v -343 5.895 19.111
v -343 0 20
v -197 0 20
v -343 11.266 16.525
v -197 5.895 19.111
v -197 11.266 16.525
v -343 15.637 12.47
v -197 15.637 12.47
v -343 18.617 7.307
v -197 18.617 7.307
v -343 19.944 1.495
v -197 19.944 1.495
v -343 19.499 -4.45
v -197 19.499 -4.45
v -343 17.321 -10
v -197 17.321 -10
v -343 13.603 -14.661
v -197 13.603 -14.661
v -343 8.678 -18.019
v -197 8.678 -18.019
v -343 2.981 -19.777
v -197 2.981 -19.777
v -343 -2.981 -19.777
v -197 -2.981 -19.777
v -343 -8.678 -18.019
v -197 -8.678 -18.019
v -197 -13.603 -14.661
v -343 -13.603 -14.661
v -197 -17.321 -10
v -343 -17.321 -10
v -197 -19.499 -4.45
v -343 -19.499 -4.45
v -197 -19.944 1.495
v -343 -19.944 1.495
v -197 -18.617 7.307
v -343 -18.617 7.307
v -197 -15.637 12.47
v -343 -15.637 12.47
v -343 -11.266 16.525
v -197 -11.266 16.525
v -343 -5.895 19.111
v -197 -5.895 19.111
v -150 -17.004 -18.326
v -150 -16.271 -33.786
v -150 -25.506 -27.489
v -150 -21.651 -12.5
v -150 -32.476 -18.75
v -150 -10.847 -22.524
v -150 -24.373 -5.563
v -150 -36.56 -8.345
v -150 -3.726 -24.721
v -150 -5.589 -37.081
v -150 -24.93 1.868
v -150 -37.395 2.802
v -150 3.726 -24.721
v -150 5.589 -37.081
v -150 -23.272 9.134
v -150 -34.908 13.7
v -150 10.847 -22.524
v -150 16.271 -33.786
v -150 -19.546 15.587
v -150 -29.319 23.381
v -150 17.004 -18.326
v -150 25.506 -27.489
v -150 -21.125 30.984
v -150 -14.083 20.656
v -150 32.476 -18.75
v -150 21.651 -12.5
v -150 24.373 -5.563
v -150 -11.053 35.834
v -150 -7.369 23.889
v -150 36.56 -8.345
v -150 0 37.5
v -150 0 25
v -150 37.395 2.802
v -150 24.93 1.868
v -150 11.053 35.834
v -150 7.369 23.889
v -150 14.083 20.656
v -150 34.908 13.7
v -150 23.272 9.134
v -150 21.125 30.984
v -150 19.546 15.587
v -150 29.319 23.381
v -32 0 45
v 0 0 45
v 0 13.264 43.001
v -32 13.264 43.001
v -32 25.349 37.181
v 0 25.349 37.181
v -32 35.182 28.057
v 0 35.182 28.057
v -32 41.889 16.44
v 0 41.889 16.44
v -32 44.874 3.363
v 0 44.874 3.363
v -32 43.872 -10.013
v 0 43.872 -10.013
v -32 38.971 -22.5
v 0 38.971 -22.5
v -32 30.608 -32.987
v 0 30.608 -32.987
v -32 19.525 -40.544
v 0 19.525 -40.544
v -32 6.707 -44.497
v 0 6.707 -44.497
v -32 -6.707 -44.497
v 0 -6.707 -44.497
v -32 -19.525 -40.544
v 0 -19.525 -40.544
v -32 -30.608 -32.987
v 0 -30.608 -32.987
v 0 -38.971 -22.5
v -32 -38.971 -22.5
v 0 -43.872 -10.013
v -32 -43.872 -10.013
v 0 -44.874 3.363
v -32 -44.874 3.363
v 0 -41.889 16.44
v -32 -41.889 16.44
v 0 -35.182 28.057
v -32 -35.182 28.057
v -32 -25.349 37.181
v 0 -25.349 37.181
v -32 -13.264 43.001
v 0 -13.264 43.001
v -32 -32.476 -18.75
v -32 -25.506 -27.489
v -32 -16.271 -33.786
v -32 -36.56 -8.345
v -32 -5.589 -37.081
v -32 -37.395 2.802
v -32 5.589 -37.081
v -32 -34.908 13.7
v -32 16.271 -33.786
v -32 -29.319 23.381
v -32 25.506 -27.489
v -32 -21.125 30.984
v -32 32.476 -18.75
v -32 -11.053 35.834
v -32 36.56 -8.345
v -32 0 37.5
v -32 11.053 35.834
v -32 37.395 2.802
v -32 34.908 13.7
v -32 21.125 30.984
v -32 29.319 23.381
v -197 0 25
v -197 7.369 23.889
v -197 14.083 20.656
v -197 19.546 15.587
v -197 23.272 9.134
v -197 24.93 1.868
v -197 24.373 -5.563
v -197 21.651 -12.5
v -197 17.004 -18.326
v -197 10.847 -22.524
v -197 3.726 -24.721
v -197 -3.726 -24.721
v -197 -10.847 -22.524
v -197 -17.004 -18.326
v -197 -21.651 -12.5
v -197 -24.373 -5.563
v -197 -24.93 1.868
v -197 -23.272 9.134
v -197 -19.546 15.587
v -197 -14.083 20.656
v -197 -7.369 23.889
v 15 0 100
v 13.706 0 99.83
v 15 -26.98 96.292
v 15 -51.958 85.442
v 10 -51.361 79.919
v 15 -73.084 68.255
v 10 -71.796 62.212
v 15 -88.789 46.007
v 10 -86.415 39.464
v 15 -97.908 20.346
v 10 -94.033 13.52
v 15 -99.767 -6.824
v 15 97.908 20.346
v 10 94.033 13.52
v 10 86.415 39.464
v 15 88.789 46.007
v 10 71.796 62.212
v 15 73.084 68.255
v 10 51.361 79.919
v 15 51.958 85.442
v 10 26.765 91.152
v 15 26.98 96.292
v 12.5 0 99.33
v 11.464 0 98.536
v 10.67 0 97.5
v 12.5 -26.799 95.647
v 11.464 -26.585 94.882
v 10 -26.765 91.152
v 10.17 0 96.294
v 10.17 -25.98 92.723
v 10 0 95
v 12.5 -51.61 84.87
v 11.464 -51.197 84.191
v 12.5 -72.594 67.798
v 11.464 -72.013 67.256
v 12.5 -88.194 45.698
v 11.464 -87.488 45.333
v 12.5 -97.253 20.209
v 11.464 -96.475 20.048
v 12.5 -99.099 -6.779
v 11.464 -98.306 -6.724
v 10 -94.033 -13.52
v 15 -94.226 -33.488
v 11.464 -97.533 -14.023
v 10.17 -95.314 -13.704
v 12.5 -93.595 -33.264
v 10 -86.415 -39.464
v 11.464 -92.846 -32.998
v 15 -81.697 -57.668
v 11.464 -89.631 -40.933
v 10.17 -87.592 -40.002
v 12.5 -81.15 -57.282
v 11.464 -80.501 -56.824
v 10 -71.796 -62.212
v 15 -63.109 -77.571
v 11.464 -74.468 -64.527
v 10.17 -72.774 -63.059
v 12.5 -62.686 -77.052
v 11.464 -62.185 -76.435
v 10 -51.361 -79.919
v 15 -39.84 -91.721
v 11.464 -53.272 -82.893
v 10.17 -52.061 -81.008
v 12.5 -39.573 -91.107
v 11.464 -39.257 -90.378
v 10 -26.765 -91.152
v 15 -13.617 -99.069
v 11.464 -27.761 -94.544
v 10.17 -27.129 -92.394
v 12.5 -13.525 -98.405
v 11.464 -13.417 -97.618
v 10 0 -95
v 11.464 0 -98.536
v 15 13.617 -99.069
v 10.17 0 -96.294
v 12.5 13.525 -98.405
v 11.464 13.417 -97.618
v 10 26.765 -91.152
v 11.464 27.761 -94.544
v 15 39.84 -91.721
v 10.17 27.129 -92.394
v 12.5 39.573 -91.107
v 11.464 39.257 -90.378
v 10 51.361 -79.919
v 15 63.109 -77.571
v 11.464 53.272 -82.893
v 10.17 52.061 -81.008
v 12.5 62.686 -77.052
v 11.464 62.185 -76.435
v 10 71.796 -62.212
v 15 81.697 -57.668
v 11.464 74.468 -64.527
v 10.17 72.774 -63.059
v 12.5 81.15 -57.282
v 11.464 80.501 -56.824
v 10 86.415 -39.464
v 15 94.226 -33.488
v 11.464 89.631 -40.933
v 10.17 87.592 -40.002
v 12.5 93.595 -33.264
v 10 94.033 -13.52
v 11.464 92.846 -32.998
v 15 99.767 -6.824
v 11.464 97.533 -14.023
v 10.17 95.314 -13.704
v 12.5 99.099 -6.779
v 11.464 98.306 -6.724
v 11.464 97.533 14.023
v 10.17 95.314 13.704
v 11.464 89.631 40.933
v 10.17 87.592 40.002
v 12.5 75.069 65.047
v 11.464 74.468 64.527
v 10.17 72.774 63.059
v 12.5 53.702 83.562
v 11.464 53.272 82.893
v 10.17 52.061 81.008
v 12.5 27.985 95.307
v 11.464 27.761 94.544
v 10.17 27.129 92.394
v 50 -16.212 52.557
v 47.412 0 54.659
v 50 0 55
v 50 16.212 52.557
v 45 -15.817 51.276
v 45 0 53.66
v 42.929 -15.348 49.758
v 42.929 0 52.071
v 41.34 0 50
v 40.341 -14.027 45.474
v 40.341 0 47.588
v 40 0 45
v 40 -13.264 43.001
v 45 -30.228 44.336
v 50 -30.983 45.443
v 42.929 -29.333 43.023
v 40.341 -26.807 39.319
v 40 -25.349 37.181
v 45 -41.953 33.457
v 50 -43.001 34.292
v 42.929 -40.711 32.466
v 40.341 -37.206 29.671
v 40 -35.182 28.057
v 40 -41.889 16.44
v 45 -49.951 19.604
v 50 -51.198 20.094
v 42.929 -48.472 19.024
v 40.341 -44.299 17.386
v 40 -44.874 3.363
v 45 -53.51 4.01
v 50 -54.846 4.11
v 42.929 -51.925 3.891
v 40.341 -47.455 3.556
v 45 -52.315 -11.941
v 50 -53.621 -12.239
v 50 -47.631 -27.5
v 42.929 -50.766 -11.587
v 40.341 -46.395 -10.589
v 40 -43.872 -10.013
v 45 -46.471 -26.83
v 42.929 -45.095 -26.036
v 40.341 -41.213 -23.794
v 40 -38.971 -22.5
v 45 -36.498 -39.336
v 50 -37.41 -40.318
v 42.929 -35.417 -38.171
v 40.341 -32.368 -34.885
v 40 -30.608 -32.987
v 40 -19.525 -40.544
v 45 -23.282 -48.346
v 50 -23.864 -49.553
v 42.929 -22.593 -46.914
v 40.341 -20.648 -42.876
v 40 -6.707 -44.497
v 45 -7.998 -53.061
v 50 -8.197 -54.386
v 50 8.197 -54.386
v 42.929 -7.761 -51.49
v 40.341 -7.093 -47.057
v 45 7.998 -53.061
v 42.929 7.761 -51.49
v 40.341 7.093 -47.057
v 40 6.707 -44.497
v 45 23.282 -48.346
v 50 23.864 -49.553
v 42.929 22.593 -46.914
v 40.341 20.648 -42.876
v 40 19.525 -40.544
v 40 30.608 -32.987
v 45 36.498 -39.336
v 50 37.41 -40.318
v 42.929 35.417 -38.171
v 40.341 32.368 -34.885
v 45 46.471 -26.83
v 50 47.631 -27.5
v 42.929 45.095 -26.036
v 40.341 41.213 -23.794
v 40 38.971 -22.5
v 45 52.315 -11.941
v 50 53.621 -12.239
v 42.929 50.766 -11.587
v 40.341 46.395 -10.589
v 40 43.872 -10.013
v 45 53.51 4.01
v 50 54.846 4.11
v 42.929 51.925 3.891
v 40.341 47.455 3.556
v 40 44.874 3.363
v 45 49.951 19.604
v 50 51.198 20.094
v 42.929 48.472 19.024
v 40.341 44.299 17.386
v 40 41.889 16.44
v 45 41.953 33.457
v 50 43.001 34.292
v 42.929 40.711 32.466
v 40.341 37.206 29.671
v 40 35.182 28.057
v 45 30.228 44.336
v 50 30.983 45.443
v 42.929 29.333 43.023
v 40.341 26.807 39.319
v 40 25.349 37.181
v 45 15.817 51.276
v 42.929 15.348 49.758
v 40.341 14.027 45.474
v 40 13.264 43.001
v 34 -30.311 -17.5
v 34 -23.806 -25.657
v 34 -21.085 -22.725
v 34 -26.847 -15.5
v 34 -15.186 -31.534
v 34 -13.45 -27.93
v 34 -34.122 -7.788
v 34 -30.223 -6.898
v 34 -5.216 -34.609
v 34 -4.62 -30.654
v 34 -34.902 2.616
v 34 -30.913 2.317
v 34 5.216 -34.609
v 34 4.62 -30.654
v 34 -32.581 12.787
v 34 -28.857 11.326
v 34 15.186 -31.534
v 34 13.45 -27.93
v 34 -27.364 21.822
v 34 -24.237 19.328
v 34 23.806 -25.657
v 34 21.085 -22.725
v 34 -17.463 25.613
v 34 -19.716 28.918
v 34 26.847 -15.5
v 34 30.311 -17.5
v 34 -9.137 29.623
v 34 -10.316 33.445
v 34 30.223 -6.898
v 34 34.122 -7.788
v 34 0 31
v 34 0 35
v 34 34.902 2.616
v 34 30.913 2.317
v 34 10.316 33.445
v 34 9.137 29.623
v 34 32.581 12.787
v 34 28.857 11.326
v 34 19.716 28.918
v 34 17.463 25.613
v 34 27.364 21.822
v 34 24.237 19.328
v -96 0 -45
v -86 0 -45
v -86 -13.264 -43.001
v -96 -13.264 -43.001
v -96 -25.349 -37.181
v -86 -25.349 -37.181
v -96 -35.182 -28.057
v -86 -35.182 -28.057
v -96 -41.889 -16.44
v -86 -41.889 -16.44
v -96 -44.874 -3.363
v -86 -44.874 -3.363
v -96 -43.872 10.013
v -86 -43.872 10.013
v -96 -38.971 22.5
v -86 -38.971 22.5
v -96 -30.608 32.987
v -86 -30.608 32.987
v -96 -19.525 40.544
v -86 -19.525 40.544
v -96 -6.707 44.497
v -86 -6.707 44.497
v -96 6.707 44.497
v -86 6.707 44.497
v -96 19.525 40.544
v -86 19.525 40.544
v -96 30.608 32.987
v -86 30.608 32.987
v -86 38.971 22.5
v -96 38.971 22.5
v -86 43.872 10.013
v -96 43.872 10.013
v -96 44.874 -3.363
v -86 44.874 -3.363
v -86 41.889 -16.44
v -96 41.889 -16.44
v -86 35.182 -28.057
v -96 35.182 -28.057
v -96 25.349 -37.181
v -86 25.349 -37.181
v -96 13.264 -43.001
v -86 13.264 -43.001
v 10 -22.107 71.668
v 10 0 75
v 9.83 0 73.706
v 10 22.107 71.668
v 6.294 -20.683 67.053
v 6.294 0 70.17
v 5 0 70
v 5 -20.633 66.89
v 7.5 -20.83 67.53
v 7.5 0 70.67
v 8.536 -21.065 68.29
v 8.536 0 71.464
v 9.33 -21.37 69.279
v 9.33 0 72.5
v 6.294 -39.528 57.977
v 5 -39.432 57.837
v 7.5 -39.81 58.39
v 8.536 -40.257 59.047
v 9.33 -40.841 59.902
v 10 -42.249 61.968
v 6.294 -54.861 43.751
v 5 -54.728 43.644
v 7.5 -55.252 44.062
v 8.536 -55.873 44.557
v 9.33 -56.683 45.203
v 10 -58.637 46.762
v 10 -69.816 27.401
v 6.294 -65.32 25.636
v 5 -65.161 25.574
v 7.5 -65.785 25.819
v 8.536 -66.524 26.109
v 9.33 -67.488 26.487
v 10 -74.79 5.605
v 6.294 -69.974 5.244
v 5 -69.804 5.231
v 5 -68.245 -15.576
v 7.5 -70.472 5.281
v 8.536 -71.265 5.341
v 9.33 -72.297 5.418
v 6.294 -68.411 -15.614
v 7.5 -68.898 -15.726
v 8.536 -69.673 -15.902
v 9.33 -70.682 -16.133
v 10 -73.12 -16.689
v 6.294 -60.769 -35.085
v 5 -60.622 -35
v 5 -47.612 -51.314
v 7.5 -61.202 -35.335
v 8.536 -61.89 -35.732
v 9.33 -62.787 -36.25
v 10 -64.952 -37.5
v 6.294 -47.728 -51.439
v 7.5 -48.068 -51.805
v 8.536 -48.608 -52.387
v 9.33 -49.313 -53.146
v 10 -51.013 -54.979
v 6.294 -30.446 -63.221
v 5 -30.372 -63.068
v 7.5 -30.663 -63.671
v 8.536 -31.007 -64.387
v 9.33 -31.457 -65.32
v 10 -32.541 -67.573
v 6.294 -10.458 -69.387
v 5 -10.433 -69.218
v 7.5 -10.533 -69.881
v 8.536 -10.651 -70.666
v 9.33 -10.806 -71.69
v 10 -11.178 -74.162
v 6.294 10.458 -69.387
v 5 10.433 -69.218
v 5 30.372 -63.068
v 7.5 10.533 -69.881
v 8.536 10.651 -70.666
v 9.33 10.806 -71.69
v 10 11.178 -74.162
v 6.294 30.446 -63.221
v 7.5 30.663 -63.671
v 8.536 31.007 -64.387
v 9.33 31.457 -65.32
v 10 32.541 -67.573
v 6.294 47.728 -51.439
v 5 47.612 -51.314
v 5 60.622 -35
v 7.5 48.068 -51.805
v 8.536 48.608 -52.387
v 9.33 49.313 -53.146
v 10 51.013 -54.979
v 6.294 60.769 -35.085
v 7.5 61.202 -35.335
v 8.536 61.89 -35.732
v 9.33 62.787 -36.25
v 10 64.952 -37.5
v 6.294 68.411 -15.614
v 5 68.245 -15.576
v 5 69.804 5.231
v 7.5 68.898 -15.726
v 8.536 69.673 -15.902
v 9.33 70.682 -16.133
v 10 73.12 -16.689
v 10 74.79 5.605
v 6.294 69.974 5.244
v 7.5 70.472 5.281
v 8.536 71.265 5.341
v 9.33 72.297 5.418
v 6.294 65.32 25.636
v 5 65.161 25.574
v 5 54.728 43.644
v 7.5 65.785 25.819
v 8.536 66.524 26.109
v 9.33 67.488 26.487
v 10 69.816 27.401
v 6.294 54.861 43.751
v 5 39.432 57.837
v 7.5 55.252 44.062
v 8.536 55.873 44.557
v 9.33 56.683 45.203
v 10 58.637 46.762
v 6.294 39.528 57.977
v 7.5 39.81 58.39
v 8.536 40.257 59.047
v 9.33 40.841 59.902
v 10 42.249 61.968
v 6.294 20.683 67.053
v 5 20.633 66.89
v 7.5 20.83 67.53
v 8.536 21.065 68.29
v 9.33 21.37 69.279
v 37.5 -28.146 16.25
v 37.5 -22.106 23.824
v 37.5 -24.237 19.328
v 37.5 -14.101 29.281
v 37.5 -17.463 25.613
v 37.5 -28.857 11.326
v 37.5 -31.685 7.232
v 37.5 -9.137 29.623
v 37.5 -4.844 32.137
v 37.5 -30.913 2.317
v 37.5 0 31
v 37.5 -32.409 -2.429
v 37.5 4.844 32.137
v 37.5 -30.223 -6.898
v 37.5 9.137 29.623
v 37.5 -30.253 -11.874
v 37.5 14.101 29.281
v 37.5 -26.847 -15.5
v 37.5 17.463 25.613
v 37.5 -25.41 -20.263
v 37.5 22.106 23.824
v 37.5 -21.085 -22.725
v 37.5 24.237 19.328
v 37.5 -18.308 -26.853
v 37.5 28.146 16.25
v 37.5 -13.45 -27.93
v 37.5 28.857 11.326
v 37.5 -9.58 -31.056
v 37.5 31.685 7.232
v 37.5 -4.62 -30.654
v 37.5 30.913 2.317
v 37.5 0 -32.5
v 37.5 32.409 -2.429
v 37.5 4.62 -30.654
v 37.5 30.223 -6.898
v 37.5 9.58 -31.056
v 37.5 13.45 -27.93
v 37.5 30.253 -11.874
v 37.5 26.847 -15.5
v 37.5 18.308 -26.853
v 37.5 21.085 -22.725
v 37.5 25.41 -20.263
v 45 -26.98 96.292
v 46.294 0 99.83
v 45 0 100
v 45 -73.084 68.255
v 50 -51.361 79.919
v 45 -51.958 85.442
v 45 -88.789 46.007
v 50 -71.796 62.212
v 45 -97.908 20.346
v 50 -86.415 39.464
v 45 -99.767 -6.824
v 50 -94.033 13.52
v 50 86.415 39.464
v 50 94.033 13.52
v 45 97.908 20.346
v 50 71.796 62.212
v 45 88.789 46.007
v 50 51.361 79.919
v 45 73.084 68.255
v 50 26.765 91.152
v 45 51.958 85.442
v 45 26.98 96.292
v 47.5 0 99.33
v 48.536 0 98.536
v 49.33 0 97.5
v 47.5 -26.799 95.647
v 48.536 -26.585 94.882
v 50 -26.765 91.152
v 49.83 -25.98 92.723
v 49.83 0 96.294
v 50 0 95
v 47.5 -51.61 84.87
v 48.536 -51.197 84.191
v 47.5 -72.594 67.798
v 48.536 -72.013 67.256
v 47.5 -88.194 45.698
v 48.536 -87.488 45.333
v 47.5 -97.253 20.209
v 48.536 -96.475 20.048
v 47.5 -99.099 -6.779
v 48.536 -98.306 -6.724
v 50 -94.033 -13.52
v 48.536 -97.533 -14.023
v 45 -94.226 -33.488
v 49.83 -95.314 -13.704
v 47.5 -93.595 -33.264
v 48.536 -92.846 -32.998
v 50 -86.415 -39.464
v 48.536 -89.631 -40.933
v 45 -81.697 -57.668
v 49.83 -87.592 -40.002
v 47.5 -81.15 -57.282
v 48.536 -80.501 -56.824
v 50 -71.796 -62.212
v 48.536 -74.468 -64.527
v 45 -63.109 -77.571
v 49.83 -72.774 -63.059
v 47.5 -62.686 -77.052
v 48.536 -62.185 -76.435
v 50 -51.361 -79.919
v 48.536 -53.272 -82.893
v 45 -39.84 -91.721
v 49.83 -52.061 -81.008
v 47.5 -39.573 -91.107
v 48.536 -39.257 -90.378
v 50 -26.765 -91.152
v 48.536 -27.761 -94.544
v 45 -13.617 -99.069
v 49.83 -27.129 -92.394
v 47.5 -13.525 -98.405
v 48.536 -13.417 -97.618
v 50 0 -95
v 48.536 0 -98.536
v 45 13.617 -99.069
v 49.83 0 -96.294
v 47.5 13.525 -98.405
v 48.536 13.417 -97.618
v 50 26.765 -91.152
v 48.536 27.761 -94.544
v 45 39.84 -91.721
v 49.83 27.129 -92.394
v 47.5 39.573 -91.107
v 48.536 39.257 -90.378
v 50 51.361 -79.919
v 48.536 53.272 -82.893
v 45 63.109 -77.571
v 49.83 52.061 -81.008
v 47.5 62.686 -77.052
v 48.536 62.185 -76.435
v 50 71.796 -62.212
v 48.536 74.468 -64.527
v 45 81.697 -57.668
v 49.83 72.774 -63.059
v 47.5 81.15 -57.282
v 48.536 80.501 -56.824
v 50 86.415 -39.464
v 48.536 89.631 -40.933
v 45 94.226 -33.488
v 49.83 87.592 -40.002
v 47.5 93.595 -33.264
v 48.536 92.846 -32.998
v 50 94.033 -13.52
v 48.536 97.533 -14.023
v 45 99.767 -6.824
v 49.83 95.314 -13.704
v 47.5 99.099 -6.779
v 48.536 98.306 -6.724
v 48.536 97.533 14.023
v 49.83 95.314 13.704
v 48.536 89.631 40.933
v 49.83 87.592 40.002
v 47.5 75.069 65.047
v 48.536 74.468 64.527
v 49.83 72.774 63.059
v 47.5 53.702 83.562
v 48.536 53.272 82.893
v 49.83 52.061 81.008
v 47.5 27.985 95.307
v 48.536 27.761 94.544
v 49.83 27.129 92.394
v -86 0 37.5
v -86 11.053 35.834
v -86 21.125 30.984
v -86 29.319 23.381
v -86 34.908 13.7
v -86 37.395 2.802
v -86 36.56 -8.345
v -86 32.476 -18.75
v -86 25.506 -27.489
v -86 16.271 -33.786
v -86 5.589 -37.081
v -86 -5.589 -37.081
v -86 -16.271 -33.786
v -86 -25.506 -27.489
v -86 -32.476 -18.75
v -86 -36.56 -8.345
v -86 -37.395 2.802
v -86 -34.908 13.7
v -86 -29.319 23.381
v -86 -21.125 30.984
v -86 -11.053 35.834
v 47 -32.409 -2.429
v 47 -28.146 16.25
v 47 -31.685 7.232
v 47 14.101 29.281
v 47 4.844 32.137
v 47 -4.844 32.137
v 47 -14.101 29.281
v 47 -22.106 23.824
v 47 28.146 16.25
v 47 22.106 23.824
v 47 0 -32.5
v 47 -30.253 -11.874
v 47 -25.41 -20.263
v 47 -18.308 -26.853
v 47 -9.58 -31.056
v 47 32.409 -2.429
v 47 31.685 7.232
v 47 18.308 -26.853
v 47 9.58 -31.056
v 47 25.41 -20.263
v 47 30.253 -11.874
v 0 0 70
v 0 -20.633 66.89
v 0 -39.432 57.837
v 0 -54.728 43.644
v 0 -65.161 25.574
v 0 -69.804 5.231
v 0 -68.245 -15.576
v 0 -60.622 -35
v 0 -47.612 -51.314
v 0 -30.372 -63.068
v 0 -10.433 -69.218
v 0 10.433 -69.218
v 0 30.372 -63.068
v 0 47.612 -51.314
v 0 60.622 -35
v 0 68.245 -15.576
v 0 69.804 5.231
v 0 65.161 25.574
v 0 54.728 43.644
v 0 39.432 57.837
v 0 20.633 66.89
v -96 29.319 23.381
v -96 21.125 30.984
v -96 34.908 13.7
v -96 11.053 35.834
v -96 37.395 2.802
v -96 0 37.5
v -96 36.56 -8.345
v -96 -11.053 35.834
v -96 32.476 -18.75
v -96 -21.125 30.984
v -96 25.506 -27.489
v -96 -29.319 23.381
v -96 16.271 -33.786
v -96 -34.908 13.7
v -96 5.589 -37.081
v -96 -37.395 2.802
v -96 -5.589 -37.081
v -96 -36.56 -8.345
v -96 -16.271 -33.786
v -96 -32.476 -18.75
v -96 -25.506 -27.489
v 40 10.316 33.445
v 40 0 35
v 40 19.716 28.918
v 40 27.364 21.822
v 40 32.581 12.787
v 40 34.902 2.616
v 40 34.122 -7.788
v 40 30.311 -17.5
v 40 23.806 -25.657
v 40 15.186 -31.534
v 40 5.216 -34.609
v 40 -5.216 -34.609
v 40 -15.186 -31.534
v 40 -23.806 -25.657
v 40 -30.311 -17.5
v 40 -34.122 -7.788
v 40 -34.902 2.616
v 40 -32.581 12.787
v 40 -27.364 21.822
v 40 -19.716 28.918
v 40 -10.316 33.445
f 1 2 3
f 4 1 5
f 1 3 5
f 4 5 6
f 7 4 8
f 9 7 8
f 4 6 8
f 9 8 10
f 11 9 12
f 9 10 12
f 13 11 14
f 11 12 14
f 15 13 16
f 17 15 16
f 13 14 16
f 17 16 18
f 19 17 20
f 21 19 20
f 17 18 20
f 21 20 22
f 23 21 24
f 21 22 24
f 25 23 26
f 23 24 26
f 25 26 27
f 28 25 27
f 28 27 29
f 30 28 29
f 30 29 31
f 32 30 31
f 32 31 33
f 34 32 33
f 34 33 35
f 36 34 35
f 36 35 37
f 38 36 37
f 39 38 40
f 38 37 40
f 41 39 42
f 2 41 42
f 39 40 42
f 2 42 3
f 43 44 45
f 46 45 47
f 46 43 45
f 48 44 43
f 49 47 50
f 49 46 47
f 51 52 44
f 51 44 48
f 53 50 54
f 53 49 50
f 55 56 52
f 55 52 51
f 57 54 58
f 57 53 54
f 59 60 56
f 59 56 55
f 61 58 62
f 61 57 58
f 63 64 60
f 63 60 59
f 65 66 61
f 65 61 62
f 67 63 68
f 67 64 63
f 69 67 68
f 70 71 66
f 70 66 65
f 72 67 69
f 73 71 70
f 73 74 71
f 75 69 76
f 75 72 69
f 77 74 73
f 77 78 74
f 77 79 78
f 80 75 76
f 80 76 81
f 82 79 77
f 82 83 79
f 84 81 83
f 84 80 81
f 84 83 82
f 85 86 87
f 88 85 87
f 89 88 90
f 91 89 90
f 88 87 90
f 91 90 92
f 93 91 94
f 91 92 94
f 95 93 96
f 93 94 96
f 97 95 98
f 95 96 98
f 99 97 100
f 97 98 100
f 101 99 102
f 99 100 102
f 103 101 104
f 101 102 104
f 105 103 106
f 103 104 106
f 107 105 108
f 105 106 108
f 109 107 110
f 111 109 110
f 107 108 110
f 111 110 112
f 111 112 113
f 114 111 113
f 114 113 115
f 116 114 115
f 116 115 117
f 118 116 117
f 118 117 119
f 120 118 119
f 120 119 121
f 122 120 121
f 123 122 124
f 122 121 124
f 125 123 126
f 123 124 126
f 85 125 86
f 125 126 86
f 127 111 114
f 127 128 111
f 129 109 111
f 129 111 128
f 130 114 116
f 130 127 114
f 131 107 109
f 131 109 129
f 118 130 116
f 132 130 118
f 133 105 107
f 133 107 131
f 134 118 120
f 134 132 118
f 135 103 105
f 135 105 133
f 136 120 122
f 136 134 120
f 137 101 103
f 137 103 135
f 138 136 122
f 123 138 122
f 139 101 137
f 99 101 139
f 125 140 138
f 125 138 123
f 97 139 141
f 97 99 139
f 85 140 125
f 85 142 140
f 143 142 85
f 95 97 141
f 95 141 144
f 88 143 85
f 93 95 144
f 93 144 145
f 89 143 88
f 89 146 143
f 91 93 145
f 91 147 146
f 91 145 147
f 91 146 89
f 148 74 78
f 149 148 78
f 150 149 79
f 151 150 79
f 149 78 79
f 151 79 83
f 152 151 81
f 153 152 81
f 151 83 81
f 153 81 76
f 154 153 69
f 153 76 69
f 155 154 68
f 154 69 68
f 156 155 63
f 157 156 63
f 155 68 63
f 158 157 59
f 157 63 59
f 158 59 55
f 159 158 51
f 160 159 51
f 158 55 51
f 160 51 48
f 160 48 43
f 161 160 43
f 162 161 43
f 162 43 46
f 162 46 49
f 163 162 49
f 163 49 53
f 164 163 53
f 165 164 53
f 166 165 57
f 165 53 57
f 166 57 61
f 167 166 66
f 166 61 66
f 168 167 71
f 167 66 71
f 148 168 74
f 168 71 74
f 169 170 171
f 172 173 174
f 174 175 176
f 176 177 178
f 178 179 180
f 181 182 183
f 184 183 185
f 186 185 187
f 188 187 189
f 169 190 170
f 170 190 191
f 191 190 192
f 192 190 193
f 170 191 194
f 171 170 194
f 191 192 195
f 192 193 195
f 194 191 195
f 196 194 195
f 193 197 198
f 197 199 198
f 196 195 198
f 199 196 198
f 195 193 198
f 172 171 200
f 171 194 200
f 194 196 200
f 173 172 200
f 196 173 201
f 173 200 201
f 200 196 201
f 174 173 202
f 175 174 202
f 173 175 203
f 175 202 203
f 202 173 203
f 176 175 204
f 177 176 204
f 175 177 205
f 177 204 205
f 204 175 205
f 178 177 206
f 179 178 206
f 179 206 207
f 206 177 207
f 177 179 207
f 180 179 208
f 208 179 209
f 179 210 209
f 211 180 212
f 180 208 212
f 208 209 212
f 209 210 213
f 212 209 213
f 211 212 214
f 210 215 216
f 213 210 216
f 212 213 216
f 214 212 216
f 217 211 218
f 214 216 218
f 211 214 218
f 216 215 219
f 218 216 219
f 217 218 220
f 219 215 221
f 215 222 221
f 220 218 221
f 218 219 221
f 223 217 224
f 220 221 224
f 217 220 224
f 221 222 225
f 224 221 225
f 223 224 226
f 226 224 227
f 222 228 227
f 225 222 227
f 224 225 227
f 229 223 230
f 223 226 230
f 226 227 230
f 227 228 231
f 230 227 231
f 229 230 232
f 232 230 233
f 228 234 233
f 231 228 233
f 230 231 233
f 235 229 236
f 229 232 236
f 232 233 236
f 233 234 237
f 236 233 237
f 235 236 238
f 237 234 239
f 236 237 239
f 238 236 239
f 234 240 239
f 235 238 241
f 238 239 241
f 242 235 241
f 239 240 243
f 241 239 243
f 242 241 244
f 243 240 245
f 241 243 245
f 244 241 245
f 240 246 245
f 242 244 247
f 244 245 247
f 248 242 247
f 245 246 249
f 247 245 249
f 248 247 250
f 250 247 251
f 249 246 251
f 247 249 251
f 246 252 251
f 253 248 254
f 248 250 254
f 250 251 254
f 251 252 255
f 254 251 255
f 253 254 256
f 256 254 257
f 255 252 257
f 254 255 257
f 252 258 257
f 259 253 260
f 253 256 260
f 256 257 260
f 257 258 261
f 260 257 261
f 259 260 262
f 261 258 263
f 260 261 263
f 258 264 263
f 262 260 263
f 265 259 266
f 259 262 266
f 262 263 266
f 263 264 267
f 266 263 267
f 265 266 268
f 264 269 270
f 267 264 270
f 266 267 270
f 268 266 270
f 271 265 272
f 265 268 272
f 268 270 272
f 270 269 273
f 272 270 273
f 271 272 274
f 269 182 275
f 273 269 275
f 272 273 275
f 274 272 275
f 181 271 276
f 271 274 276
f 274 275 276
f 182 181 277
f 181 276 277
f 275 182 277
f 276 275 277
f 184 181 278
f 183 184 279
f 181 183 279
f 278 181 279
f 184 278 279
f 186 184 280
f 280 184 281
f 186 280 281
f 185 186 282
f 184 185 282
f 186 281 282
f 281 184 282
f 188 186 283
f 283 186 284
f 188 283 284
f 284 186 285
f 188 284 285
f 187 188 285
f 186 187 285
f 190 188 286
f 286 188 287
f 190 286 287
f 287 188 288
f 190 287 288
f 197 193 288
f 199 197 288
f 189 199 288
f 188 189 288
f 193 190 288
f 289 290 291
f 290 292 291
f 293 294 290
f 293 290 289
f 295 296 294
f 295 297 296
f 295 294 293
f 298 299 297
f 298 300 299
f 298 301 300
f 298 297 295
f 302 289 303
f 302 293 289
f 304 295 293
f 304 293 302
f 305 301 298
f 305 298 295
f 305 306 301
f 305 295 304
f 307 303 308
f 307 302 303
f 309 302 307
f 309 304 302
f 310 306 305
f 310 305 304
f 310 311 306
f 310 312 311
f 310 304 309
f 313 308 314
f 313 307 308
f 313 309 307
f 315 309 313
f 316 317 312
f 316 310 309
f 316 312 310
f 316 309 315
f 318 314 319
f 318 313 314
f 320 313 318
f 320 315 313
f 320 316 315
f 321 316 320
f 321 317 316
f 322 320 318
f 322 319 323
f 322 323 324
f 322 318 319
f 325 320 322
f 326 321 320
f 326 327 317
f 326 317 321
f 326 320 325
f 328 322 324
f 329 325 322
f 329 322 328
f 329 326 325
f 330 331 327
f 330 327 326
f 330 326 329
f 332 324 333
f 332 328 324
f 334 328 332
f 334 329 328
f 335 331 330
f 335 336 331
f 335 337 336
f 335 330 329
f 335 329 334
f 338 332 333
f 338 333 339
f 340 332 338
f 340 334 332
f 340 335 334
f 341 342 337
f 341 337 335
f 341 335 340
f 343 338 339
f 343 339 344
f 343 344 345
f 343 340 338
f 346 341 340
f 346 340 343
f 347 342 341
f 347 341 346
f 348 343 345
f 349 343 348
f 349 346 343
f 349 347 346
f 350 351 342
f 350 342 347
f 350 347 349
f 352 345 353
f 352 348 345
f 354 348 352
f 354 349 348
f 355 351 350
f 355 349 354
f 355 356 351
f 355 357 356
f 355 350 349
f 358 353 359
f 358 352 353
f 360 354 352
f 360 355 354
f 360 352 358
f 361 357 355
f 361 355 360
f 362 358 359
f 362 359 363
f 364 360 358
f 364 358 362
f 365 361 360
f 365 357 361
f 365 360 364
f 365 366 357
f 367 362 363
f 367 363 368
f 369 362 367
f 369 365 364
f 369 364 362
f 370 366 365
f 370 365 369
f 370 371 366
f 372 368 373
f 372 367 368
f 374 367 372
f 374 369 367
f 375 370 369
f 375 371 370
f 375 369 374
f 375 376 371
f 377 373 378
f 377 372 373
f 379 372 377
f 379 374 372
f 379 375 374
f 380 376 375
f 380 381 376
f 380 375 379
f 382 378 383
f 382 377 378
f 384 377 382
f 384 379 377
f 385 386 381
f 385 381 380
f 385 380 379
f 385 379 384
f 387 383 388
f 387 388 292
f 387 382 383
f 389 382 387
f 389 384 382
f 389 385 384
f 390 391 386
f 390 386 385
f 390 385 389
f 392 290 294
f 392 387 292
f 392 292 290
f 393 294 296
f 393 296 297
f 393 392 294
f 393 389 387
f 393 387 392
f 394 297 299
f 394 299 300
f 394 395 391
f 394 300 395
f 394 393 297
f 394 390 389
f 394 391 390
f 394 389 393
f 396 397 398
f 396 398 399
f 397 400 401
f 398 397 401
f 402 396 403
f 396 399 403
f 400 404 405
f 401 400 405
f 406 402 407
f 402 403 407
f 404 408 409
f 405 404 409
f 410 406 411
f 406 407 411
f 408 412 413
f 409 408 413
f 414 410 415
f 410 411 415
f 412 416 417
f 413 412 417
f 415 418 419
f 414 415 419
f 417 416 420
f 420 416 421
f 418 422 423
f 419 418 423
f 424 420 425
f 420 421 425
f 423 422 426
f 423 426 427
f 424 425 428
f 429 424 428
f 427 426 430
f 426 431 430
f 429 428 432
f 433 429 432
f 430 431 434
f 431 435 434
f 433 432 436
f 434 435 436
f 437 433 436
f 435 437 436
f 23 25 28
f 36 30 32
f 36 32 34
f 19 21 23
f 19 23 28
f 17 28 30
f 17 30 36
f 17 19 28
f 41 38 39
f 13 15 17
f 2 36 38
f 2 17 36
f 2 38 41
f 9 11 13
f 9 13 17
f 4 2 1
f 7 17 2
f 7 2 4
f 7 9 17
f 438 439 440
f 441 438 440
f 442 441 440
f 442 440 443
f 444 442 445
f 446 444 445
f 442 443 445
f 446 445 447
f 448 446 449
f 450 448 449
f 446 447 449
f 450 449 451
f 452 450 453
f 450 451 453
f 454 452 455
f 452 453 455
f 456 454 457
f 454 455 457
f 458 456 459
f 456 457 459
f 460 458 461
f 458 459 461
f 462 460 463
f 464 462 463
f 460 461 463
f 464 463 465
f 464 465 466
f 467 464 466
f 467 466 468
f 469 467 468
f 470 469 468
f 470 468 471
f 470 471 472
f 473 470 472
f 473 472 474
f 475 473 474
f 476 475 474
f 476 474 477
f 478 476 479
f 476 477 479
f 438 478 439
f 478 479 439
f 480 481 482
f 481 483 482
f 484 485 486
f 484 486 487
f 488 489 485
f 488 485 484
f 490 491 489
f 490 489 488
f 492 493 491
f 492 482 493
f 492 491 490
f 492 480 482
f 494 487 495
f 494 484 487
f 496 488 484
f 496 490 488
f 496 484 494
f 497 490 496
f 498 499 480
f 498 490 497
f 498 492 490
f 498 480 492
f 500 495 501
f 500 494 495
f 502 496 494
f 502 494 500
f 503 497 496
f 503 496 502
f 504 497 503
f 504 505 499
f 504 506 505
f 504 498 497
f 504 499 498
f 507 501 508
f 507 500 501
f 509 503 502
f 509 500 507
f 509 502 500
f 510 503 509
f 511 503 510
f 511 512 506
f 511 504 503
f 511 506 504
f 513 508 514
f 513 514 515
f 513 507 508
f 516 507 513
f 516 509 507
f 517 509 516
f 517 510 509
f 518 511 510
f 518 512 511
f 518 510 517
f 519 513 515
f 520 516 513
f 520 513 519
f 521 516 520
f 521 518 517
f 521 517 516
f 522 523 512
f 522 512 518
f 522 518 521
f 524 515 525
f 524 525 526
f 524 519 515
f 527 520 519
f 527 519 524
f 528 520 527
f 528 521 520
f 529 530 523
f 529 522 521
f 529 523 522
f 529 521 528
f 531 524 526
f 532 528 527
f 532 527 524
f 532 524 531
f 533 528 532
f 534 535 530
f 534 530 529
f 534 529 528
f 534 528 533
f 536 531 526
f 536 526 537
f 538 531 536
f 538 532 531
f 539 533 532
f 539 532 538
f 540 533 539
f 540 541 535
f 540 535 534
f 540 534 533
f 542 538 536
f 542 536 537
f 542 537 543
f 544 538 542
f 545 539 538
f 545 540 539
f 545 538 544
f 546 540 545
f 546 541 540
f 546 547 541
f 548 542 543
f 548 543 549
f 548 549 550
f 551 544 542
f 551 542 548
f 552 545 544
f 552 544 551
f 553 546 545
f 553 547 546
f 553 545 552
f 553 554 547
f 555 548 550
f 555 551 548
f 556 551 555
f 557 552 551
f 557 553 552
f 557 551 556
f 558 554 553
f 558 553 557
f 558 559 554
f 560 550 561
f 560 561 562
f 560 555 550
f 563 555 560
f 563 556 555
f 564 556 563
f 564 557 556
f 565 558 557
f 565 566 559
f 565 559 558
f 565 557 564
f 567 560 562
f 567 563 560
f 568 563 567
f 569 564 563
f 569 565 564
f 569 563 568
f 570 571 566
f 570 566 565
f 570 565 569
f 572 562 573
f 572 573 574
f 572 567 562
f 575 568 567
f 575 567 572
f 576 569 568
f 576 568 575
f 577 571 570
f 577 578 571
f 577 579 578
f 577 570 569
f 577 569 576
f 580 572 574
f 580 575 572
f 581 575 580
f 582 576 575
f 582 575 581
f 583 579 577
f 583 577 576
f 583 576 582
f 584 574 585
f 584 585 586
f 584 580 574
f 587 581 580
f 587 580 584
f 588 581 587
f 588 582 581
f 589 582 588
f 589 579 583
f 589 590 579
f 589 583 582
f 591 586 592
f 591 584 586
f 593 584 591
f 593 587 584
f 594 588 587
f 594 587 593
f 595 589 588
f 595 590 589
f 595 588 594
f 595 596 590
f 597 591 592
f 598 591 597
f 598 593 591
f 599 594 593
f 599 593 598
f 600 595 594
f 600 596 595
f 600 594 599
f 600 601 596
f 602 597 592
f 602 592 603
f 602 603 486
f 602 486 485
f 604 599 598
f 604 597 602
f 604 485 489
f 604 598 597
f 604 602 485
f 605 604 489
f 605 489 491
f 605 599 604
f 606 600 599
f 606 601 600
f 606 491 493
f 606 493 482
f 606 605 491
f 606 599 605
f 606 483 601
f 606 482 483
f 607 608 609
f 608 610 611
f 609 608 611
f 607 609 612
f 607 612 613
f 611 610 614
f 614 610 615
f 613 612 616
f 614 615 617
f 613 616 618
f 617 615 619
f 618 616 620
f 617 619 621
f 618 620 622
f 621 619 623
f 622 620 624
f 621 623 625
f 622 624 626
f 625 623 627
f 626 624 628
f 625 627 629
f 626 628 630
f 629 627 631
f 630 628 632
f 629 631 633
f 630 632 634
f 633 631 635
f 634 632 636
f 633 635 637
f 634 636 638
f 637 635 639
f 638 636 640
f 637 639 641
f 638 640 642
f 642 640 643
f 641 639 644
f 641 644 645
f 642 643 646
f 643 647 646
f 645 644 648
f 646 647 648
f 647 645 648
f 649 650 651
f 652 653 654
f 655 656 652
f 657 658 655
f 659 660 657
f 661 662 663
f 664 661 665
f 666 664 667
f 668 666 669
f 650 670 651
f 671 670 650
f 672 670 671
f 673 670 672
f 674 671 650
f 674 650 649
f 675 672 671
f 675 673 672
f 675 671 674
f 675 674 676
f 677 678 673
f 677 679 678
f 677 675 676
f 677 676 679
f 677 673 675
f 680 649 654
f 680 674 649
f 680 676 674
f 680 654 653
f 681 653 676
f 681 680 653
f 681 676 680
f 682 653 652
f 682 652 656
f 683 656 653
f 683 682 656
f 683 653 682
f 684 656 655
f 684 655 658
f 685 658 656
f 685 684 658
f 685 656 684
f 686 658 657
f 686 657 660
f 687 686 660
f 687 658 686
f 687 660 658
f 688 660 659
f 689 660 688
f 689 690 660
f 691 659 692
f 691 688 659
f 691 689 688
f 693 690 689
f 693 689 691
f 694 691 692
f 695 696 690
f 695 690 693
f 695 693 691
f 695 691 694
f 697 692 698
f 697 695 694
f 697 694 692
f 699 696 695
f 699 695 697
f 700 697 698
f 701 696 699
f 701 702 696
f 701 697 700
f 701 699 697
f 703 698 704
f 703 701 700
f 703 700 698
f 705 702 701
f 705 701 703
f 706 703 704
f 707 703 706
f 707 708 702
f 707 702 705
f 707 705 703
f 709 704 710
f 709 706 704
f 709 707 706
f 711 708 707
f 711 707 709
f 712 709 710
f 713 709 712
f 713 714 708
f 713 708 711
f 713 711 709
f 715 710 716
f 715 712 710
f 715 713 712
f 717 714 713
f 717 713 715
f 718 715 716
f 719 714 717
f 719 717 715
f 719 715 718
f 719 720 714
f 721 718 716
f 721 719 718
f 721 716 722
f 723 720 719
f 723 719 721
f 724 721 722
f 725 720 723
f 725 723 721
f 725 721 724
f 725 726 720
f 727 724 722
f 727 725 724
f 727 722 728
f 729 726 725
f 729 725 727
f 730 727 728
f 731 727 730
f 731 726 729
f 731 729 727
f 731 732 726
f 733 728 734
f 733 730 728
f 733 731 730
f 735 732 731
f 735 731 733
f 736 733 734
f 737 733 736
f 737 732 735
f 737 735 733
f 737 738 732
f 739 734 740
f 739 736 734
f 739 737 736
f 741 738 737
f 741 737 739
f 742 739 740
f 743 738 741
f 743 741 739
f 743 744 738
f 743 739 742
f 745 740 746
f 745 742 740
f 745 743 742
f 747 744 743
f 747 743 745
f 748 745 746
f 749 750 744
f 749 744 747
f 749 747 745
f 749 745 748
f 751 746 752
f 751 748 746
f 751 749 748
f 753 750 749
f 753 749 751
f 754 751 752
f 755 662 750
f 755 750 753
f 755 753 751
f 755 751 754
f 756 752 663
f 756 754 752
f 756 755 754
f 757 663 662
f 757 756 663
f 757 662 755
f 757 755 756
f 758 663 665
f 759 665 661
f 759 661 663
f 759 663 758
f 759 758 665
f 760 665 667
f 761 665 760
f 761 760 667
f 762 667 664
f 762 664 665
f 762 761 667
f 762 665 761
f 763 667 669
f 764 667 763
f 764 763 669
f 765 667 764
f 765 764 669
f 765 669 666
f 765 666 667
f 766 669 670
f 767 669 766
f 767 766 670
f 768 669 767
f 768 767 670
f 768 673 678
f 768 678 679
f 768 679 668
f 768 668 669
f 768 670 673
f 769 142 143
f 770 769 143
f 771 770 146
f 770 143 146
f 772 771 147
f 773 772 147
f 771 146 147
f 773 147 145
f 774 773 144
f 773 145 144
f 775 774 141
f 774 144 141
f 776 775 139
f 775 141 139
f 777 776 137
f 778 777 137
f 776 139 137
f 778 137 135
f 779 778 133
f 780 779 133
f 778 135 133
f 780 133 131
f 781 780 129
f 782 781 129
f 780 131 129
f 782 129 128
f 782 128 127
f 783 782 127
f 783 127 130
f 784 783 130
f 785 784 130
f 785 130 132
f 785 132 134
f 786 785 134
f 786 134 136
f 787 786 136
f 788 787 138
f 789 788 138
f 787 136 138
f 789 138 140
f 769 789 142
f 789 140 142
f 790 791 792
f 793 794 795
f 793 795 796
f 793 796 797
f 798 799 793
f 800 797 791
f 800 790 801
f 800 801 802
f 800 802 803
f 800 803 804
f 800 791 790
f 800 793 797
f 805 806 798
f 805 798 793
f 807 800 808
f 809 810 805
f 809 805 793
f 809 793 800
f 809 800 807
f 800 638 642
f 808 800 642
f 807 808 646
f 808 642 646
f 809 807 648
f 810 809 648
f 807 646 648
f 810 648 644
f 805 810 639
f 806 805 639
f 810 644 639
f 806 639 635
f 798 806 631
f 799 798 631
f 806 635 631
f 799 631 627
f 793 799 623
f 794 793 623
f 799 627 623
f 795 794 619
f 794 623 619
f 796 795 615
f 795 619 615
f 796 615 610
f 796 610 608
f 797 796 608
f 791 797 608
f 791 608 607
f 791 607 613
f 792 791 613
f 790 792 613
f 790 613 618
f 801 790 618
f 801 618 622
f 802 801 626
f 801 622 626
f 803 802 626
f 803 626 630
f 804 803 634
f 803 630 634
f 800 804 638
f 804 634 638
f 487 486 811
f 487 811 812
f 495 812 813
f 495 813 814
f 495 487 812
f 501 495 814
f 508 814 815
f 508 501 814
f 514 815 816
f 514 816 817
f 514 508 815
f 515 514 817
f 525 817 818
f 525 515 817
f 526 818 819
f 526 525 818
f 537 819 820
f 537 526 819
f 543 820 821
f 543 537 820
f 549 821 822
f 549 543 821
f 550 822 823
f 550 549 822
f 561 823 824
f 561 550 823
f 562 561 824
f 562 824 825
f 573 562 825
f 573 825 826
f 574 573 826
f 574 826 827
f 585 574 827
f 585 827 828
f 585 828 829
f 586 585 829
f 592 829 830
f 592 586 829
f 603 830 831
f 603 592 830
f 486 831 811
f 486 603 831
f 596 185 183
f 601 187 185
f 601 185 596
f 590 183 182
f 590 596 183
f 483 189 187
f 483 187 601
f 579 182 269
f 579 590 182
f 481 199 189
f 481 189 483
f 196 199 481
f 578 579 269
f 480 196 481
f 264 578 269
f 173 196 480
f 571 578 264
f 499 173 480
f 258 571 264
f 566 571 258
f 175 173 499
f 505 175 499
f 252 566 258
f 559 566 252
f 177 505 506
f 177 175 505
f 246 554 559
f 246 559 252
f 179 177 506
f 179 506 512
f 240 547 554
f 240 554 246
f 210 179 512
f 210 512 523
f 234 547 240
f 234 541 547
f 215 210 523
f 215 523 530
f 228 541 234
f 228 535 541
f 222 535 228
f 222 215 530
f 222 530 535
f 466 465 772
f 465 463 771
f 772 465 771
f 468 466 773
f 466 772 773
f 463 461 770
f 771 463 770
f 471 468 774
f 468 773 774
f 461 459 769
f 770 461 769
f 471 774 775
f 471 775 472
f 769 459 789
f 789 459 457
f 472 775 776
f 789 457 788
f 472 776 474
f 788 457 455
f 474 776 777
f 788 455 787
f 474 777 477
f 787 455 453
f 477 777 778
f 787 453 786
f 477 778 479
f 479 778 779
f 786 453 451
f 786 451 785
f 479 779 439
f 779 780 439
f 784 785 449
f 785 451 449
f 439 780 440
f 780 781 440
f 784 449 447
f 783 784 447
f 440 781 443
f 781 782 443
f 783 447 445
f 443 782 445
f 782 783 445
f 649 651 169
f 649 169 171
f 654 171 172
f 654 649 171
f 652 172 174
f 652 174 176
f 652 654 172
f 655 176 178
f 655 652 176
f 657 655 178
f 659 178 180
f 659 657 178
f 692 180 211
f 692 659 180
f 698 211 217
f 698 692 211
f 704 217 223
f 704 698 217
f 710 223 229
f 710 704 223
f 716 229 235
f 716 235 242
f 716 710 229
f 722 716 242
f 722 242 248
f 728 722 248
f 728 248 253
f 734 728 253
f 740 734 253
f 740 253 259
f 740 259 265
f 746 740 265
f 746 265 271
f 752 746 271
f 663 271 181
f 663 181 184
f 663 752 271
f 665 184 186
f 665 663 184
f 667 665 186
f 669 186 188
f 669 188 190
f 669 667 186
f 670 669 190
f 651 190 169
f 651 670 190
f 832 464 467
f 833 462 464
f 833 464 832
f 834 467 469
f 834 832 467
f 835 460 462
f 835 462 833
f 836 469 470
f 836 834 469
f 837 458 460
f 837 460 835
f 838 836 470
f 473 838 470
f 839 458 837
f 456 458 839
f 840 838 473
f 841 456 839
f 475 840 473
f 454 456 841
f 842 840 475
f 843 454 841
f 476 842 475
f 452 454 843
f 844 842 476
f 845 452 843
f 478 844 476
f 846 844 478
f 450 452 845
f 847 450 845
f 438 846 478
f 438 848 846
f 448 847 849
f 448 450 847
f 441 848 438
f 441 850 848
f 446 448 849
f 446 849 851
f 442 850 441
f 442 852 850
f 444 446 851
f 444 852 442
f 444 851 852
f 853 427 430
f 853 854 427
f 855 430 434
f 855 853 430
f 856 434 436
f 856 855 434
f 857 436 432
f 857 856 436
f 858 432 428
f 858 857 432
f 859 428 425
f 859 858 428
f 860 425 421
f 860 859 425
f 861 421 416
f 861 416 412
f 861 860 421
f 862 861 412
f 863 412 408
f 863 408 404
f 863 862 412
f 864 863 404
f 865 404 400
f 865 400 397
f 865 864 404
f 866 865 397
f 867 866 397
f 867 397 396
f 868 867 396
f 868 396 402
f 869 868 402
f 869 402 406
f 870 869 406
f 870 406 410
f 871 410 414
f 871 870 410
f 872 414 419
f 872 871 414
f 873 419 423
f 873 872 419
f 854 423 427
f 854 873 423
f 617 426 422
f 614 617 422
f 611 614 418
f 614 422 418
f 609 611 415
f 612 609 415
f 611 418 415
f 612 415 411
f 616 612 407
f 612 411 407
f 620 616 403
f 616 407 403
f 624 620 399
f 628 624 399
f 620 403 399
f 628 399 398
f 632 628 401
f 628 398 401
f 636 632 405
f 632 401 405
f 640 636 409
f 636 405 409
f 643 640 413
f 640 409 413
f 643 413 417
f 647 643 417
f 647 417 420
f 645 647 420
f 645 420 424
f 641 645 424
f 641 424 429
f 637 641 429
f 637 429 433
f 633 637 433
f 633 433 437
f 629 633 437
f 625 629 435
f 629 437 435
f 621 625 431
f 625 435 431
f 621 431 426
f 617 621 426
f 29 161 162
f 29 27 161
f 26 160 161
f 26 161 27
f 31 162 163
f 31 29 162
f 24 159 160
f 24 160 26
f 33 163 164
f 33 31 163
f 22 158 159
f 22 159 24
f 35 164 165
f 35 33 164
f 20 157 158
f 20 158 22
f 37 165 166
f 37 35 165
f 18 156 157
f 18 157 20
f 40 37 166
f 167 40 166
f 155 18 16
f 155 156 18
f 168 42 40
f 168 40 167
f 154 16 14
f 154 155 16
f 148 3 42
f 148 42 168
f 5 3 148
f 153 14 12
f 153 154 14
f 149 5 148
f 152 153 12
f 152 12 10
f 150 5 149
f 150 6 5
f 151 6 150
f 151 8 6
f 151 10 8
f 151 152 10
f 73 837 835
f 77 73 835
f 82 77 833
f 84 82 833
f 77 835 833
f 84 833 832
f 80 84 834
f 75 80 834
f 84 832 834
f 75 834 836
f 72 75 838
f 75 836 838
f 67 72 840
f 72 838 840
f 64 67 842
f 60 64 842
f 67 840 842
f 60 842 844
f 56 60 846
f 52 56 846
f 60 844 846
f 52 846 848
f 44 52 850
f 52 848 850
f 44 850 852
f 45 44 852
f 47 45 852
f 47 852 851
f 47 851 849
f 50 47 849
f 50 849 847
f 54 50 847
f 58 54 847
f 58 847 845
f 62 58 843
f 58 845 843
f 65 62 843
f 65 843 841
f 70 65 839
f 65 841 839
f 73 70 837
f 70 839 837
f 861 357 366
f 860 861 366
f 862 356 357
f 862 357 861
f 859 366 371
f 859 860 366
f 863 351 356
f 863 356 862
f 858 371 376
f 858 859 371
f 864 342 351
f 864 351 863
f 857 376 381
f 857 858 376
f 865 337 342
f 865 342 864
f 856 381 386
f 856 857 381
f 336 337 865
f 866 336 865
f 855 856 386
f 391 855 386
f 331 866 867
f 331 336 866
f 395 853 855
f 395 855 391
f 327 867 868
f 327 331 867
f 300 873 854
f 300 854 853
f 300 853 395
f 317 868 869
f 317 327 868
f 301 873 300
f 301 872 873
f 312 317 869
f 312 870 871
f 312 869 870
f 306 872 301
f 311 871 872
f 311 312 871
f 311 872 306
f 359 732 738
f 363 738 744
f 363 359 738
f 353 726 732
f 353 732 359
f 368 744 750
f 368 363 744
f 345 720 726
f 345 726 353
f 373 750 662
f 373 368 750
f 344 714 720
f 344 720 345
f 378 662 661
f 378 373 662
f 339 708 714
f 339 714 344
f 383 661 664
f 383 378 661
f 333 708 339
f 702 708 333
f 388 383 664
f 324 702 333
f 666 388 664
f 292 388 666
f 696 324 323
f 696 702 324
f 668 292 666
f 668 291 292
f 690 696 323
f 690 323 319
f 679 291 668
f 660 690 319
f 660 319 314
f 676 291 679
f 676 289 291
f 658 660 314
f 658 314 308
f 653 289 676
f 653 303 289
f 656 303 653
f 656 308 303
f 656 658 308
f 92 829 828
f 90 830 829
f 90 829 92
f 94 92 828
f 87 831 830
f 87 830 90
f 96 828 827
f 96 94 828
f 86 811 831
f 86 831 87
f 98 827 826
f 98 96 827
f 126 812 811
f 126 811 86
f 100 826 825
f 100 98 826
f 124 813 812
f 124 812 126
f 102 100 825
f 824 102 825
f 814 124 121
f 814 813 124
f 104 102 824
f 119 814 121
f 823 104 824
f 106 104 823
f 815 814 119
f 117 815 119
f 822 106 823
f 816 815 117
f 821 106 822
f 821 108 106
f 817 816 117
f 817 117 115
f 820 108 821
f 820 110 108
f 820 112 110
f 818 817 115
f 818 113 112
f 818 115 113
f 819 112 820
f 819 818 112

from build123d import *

# Parameters (mm, degrees)
FILLET_1_R      = 5
FILLET_2_R      = 10
SKETCH_2_R      = 45
SKETCH_2_R_2    = 35
EXTRUDE_1_DEPTH = 32
SKETCH_3_R      = 35
EXTRUDE_2_DEPTH = 66
SKETCH_4_R      = 37.5
EXTRUDE_3_DEPTH = 54
SKETCH_5_R      = 45
EXTRUDE_4_DEPTH = 10
SKETCH_6_R      = 37.5
EXTRUDE_5_DEPTH = 54
SKETCH_7_R      = 25
EXTRUDE_6_DEPTH = 47
SKETCH_8_R      = 20
EXTRUDE_7_DEPTH = 146
SKETCH_9_R      = 31
EXTRUDE_8_DEPTH = 3.5
SKETCH_10_R     = 32.5
EXTRUDE_9_DEPTH = 9.5


with BuildPart() as part:
    # 草图1 → 旋转1 (revolve)
    with BuildSketch(Plane.XY, mode=Mode.PRIVATE) as revolve_1_sk:
        Polygon((10, 100), (50, 100), (50, 55), (40, 55), (40, 35), (0, 35), (0, 70), (10, 70), align=None)
    revolve(revolve_1_sk.sketch.rotate(Axis((-1000, 0, 0), (1, 0, 0)), 90), axis=Axis((-1000, 0, 0), (1, 0, 0)))

    # 圆角1
    fillet_1_edges = [part.edges().sort_by_distance(p)[0] for p in [
        (10, 0, -70),
        (50, 0, -100),
        (10, 0, -100),
    ]]
    fillet(fillet_1_edges, radius=FILLET_1_R)

    # 圆角2
    fillet_2_edges = [part.edges().sort_by_distance(p)[0] for p in [
        (40, 0, -55),
    ]]
    fillet(fillet_2_edges, radius=FILLET_2_R - 0.0001)  # a hair under: the kernel refuses the full size



with BuildPart() as body_2:
    # 草图2 → 凸台-拉伸1 (new body)
    with BuildSketch(Plane.ZY):
        Circle(SKETCH_2_R)
        Circle(SKETCH_2_R_2, mode=Mode.SUBTRACT)
    extrude(amount=EXTRUDE_1_DEPTH)


with BuildPart() as part_1:
    add(part.part)

    add(body_2.part)  # 凸台-拉伸2 merges body 2
    # 草图3 → 凸台-拉伸2 (add)
    with BuildSketch(Plane.ZY.offset(32)):
        Circle(SKETCH_3_R)
    extrude(amount=-EXTRUDE_2_DEPTH)

    # 草图4 → 凸台-拉伸3 (add)
    with BuildSketch(Plane.ZY.offset(32)):
        Circle(SKETCH_4_R)
    extrude(amount=EXTRUDE_3_DEPTH)

    # 草图5 → 凸台-拉伸4 (add)
    with BuildSketch(Plane.ZY.offset(86)):
        with Locations(Location((0, 0, 0), (0, 0, 180))):
            Circle(SKETCH_5_R)
    extrude(amount=EXTRUDE_4_DEPTH)

    # 草图6 → 凸台-拉伸5 (add)
    with BuildSketch(Plane.ZY.offset(96)):
        Circle(SKETCH_6_R)
    extrude(amount=EXTRUDE_5_DEPTH)

    # 草图7 → 凸台-拉伸6 (add)
    with BuildSketch(Plane.ZY.offset(150)):
        Circle(SKETCH_7_R)
    extrude(amount=EXTRUDE_6_DEPTH)

    # 草图8 → 凸台-拉伸7 (add)
    with BuildSketch(Plane.ZY.offset(197)):
        Circle(SKETCH_8_R)
    extrude(amount=EXTRUDE_7_DEPTH)

    # 草图9 → 凸台-拉伸8 (add)
    with BuildSketch(Plane(origin=(34, 0, 0), x_dir=(0, 0, -1), z_dir=(1, 0, 0))):
        with Locations(Location((0, 0, 0), (0, 0, 180))):
            Circle(SKETCH_9_R)
    extrude(amount=EXTRUDE_8_DEPTH)

    # 草图10 → 凸台-拉伸9 (add)
    with BuildSketch(Plane(origin=(37.5, 0, 0), x_dir=(0, 0, -1), z_dir=(1, 0, 0))):
        Circle(SKETCH_10_R)
    extrude(amount=EXTRUDE_9_DEPTH)


solid = part_1.part
